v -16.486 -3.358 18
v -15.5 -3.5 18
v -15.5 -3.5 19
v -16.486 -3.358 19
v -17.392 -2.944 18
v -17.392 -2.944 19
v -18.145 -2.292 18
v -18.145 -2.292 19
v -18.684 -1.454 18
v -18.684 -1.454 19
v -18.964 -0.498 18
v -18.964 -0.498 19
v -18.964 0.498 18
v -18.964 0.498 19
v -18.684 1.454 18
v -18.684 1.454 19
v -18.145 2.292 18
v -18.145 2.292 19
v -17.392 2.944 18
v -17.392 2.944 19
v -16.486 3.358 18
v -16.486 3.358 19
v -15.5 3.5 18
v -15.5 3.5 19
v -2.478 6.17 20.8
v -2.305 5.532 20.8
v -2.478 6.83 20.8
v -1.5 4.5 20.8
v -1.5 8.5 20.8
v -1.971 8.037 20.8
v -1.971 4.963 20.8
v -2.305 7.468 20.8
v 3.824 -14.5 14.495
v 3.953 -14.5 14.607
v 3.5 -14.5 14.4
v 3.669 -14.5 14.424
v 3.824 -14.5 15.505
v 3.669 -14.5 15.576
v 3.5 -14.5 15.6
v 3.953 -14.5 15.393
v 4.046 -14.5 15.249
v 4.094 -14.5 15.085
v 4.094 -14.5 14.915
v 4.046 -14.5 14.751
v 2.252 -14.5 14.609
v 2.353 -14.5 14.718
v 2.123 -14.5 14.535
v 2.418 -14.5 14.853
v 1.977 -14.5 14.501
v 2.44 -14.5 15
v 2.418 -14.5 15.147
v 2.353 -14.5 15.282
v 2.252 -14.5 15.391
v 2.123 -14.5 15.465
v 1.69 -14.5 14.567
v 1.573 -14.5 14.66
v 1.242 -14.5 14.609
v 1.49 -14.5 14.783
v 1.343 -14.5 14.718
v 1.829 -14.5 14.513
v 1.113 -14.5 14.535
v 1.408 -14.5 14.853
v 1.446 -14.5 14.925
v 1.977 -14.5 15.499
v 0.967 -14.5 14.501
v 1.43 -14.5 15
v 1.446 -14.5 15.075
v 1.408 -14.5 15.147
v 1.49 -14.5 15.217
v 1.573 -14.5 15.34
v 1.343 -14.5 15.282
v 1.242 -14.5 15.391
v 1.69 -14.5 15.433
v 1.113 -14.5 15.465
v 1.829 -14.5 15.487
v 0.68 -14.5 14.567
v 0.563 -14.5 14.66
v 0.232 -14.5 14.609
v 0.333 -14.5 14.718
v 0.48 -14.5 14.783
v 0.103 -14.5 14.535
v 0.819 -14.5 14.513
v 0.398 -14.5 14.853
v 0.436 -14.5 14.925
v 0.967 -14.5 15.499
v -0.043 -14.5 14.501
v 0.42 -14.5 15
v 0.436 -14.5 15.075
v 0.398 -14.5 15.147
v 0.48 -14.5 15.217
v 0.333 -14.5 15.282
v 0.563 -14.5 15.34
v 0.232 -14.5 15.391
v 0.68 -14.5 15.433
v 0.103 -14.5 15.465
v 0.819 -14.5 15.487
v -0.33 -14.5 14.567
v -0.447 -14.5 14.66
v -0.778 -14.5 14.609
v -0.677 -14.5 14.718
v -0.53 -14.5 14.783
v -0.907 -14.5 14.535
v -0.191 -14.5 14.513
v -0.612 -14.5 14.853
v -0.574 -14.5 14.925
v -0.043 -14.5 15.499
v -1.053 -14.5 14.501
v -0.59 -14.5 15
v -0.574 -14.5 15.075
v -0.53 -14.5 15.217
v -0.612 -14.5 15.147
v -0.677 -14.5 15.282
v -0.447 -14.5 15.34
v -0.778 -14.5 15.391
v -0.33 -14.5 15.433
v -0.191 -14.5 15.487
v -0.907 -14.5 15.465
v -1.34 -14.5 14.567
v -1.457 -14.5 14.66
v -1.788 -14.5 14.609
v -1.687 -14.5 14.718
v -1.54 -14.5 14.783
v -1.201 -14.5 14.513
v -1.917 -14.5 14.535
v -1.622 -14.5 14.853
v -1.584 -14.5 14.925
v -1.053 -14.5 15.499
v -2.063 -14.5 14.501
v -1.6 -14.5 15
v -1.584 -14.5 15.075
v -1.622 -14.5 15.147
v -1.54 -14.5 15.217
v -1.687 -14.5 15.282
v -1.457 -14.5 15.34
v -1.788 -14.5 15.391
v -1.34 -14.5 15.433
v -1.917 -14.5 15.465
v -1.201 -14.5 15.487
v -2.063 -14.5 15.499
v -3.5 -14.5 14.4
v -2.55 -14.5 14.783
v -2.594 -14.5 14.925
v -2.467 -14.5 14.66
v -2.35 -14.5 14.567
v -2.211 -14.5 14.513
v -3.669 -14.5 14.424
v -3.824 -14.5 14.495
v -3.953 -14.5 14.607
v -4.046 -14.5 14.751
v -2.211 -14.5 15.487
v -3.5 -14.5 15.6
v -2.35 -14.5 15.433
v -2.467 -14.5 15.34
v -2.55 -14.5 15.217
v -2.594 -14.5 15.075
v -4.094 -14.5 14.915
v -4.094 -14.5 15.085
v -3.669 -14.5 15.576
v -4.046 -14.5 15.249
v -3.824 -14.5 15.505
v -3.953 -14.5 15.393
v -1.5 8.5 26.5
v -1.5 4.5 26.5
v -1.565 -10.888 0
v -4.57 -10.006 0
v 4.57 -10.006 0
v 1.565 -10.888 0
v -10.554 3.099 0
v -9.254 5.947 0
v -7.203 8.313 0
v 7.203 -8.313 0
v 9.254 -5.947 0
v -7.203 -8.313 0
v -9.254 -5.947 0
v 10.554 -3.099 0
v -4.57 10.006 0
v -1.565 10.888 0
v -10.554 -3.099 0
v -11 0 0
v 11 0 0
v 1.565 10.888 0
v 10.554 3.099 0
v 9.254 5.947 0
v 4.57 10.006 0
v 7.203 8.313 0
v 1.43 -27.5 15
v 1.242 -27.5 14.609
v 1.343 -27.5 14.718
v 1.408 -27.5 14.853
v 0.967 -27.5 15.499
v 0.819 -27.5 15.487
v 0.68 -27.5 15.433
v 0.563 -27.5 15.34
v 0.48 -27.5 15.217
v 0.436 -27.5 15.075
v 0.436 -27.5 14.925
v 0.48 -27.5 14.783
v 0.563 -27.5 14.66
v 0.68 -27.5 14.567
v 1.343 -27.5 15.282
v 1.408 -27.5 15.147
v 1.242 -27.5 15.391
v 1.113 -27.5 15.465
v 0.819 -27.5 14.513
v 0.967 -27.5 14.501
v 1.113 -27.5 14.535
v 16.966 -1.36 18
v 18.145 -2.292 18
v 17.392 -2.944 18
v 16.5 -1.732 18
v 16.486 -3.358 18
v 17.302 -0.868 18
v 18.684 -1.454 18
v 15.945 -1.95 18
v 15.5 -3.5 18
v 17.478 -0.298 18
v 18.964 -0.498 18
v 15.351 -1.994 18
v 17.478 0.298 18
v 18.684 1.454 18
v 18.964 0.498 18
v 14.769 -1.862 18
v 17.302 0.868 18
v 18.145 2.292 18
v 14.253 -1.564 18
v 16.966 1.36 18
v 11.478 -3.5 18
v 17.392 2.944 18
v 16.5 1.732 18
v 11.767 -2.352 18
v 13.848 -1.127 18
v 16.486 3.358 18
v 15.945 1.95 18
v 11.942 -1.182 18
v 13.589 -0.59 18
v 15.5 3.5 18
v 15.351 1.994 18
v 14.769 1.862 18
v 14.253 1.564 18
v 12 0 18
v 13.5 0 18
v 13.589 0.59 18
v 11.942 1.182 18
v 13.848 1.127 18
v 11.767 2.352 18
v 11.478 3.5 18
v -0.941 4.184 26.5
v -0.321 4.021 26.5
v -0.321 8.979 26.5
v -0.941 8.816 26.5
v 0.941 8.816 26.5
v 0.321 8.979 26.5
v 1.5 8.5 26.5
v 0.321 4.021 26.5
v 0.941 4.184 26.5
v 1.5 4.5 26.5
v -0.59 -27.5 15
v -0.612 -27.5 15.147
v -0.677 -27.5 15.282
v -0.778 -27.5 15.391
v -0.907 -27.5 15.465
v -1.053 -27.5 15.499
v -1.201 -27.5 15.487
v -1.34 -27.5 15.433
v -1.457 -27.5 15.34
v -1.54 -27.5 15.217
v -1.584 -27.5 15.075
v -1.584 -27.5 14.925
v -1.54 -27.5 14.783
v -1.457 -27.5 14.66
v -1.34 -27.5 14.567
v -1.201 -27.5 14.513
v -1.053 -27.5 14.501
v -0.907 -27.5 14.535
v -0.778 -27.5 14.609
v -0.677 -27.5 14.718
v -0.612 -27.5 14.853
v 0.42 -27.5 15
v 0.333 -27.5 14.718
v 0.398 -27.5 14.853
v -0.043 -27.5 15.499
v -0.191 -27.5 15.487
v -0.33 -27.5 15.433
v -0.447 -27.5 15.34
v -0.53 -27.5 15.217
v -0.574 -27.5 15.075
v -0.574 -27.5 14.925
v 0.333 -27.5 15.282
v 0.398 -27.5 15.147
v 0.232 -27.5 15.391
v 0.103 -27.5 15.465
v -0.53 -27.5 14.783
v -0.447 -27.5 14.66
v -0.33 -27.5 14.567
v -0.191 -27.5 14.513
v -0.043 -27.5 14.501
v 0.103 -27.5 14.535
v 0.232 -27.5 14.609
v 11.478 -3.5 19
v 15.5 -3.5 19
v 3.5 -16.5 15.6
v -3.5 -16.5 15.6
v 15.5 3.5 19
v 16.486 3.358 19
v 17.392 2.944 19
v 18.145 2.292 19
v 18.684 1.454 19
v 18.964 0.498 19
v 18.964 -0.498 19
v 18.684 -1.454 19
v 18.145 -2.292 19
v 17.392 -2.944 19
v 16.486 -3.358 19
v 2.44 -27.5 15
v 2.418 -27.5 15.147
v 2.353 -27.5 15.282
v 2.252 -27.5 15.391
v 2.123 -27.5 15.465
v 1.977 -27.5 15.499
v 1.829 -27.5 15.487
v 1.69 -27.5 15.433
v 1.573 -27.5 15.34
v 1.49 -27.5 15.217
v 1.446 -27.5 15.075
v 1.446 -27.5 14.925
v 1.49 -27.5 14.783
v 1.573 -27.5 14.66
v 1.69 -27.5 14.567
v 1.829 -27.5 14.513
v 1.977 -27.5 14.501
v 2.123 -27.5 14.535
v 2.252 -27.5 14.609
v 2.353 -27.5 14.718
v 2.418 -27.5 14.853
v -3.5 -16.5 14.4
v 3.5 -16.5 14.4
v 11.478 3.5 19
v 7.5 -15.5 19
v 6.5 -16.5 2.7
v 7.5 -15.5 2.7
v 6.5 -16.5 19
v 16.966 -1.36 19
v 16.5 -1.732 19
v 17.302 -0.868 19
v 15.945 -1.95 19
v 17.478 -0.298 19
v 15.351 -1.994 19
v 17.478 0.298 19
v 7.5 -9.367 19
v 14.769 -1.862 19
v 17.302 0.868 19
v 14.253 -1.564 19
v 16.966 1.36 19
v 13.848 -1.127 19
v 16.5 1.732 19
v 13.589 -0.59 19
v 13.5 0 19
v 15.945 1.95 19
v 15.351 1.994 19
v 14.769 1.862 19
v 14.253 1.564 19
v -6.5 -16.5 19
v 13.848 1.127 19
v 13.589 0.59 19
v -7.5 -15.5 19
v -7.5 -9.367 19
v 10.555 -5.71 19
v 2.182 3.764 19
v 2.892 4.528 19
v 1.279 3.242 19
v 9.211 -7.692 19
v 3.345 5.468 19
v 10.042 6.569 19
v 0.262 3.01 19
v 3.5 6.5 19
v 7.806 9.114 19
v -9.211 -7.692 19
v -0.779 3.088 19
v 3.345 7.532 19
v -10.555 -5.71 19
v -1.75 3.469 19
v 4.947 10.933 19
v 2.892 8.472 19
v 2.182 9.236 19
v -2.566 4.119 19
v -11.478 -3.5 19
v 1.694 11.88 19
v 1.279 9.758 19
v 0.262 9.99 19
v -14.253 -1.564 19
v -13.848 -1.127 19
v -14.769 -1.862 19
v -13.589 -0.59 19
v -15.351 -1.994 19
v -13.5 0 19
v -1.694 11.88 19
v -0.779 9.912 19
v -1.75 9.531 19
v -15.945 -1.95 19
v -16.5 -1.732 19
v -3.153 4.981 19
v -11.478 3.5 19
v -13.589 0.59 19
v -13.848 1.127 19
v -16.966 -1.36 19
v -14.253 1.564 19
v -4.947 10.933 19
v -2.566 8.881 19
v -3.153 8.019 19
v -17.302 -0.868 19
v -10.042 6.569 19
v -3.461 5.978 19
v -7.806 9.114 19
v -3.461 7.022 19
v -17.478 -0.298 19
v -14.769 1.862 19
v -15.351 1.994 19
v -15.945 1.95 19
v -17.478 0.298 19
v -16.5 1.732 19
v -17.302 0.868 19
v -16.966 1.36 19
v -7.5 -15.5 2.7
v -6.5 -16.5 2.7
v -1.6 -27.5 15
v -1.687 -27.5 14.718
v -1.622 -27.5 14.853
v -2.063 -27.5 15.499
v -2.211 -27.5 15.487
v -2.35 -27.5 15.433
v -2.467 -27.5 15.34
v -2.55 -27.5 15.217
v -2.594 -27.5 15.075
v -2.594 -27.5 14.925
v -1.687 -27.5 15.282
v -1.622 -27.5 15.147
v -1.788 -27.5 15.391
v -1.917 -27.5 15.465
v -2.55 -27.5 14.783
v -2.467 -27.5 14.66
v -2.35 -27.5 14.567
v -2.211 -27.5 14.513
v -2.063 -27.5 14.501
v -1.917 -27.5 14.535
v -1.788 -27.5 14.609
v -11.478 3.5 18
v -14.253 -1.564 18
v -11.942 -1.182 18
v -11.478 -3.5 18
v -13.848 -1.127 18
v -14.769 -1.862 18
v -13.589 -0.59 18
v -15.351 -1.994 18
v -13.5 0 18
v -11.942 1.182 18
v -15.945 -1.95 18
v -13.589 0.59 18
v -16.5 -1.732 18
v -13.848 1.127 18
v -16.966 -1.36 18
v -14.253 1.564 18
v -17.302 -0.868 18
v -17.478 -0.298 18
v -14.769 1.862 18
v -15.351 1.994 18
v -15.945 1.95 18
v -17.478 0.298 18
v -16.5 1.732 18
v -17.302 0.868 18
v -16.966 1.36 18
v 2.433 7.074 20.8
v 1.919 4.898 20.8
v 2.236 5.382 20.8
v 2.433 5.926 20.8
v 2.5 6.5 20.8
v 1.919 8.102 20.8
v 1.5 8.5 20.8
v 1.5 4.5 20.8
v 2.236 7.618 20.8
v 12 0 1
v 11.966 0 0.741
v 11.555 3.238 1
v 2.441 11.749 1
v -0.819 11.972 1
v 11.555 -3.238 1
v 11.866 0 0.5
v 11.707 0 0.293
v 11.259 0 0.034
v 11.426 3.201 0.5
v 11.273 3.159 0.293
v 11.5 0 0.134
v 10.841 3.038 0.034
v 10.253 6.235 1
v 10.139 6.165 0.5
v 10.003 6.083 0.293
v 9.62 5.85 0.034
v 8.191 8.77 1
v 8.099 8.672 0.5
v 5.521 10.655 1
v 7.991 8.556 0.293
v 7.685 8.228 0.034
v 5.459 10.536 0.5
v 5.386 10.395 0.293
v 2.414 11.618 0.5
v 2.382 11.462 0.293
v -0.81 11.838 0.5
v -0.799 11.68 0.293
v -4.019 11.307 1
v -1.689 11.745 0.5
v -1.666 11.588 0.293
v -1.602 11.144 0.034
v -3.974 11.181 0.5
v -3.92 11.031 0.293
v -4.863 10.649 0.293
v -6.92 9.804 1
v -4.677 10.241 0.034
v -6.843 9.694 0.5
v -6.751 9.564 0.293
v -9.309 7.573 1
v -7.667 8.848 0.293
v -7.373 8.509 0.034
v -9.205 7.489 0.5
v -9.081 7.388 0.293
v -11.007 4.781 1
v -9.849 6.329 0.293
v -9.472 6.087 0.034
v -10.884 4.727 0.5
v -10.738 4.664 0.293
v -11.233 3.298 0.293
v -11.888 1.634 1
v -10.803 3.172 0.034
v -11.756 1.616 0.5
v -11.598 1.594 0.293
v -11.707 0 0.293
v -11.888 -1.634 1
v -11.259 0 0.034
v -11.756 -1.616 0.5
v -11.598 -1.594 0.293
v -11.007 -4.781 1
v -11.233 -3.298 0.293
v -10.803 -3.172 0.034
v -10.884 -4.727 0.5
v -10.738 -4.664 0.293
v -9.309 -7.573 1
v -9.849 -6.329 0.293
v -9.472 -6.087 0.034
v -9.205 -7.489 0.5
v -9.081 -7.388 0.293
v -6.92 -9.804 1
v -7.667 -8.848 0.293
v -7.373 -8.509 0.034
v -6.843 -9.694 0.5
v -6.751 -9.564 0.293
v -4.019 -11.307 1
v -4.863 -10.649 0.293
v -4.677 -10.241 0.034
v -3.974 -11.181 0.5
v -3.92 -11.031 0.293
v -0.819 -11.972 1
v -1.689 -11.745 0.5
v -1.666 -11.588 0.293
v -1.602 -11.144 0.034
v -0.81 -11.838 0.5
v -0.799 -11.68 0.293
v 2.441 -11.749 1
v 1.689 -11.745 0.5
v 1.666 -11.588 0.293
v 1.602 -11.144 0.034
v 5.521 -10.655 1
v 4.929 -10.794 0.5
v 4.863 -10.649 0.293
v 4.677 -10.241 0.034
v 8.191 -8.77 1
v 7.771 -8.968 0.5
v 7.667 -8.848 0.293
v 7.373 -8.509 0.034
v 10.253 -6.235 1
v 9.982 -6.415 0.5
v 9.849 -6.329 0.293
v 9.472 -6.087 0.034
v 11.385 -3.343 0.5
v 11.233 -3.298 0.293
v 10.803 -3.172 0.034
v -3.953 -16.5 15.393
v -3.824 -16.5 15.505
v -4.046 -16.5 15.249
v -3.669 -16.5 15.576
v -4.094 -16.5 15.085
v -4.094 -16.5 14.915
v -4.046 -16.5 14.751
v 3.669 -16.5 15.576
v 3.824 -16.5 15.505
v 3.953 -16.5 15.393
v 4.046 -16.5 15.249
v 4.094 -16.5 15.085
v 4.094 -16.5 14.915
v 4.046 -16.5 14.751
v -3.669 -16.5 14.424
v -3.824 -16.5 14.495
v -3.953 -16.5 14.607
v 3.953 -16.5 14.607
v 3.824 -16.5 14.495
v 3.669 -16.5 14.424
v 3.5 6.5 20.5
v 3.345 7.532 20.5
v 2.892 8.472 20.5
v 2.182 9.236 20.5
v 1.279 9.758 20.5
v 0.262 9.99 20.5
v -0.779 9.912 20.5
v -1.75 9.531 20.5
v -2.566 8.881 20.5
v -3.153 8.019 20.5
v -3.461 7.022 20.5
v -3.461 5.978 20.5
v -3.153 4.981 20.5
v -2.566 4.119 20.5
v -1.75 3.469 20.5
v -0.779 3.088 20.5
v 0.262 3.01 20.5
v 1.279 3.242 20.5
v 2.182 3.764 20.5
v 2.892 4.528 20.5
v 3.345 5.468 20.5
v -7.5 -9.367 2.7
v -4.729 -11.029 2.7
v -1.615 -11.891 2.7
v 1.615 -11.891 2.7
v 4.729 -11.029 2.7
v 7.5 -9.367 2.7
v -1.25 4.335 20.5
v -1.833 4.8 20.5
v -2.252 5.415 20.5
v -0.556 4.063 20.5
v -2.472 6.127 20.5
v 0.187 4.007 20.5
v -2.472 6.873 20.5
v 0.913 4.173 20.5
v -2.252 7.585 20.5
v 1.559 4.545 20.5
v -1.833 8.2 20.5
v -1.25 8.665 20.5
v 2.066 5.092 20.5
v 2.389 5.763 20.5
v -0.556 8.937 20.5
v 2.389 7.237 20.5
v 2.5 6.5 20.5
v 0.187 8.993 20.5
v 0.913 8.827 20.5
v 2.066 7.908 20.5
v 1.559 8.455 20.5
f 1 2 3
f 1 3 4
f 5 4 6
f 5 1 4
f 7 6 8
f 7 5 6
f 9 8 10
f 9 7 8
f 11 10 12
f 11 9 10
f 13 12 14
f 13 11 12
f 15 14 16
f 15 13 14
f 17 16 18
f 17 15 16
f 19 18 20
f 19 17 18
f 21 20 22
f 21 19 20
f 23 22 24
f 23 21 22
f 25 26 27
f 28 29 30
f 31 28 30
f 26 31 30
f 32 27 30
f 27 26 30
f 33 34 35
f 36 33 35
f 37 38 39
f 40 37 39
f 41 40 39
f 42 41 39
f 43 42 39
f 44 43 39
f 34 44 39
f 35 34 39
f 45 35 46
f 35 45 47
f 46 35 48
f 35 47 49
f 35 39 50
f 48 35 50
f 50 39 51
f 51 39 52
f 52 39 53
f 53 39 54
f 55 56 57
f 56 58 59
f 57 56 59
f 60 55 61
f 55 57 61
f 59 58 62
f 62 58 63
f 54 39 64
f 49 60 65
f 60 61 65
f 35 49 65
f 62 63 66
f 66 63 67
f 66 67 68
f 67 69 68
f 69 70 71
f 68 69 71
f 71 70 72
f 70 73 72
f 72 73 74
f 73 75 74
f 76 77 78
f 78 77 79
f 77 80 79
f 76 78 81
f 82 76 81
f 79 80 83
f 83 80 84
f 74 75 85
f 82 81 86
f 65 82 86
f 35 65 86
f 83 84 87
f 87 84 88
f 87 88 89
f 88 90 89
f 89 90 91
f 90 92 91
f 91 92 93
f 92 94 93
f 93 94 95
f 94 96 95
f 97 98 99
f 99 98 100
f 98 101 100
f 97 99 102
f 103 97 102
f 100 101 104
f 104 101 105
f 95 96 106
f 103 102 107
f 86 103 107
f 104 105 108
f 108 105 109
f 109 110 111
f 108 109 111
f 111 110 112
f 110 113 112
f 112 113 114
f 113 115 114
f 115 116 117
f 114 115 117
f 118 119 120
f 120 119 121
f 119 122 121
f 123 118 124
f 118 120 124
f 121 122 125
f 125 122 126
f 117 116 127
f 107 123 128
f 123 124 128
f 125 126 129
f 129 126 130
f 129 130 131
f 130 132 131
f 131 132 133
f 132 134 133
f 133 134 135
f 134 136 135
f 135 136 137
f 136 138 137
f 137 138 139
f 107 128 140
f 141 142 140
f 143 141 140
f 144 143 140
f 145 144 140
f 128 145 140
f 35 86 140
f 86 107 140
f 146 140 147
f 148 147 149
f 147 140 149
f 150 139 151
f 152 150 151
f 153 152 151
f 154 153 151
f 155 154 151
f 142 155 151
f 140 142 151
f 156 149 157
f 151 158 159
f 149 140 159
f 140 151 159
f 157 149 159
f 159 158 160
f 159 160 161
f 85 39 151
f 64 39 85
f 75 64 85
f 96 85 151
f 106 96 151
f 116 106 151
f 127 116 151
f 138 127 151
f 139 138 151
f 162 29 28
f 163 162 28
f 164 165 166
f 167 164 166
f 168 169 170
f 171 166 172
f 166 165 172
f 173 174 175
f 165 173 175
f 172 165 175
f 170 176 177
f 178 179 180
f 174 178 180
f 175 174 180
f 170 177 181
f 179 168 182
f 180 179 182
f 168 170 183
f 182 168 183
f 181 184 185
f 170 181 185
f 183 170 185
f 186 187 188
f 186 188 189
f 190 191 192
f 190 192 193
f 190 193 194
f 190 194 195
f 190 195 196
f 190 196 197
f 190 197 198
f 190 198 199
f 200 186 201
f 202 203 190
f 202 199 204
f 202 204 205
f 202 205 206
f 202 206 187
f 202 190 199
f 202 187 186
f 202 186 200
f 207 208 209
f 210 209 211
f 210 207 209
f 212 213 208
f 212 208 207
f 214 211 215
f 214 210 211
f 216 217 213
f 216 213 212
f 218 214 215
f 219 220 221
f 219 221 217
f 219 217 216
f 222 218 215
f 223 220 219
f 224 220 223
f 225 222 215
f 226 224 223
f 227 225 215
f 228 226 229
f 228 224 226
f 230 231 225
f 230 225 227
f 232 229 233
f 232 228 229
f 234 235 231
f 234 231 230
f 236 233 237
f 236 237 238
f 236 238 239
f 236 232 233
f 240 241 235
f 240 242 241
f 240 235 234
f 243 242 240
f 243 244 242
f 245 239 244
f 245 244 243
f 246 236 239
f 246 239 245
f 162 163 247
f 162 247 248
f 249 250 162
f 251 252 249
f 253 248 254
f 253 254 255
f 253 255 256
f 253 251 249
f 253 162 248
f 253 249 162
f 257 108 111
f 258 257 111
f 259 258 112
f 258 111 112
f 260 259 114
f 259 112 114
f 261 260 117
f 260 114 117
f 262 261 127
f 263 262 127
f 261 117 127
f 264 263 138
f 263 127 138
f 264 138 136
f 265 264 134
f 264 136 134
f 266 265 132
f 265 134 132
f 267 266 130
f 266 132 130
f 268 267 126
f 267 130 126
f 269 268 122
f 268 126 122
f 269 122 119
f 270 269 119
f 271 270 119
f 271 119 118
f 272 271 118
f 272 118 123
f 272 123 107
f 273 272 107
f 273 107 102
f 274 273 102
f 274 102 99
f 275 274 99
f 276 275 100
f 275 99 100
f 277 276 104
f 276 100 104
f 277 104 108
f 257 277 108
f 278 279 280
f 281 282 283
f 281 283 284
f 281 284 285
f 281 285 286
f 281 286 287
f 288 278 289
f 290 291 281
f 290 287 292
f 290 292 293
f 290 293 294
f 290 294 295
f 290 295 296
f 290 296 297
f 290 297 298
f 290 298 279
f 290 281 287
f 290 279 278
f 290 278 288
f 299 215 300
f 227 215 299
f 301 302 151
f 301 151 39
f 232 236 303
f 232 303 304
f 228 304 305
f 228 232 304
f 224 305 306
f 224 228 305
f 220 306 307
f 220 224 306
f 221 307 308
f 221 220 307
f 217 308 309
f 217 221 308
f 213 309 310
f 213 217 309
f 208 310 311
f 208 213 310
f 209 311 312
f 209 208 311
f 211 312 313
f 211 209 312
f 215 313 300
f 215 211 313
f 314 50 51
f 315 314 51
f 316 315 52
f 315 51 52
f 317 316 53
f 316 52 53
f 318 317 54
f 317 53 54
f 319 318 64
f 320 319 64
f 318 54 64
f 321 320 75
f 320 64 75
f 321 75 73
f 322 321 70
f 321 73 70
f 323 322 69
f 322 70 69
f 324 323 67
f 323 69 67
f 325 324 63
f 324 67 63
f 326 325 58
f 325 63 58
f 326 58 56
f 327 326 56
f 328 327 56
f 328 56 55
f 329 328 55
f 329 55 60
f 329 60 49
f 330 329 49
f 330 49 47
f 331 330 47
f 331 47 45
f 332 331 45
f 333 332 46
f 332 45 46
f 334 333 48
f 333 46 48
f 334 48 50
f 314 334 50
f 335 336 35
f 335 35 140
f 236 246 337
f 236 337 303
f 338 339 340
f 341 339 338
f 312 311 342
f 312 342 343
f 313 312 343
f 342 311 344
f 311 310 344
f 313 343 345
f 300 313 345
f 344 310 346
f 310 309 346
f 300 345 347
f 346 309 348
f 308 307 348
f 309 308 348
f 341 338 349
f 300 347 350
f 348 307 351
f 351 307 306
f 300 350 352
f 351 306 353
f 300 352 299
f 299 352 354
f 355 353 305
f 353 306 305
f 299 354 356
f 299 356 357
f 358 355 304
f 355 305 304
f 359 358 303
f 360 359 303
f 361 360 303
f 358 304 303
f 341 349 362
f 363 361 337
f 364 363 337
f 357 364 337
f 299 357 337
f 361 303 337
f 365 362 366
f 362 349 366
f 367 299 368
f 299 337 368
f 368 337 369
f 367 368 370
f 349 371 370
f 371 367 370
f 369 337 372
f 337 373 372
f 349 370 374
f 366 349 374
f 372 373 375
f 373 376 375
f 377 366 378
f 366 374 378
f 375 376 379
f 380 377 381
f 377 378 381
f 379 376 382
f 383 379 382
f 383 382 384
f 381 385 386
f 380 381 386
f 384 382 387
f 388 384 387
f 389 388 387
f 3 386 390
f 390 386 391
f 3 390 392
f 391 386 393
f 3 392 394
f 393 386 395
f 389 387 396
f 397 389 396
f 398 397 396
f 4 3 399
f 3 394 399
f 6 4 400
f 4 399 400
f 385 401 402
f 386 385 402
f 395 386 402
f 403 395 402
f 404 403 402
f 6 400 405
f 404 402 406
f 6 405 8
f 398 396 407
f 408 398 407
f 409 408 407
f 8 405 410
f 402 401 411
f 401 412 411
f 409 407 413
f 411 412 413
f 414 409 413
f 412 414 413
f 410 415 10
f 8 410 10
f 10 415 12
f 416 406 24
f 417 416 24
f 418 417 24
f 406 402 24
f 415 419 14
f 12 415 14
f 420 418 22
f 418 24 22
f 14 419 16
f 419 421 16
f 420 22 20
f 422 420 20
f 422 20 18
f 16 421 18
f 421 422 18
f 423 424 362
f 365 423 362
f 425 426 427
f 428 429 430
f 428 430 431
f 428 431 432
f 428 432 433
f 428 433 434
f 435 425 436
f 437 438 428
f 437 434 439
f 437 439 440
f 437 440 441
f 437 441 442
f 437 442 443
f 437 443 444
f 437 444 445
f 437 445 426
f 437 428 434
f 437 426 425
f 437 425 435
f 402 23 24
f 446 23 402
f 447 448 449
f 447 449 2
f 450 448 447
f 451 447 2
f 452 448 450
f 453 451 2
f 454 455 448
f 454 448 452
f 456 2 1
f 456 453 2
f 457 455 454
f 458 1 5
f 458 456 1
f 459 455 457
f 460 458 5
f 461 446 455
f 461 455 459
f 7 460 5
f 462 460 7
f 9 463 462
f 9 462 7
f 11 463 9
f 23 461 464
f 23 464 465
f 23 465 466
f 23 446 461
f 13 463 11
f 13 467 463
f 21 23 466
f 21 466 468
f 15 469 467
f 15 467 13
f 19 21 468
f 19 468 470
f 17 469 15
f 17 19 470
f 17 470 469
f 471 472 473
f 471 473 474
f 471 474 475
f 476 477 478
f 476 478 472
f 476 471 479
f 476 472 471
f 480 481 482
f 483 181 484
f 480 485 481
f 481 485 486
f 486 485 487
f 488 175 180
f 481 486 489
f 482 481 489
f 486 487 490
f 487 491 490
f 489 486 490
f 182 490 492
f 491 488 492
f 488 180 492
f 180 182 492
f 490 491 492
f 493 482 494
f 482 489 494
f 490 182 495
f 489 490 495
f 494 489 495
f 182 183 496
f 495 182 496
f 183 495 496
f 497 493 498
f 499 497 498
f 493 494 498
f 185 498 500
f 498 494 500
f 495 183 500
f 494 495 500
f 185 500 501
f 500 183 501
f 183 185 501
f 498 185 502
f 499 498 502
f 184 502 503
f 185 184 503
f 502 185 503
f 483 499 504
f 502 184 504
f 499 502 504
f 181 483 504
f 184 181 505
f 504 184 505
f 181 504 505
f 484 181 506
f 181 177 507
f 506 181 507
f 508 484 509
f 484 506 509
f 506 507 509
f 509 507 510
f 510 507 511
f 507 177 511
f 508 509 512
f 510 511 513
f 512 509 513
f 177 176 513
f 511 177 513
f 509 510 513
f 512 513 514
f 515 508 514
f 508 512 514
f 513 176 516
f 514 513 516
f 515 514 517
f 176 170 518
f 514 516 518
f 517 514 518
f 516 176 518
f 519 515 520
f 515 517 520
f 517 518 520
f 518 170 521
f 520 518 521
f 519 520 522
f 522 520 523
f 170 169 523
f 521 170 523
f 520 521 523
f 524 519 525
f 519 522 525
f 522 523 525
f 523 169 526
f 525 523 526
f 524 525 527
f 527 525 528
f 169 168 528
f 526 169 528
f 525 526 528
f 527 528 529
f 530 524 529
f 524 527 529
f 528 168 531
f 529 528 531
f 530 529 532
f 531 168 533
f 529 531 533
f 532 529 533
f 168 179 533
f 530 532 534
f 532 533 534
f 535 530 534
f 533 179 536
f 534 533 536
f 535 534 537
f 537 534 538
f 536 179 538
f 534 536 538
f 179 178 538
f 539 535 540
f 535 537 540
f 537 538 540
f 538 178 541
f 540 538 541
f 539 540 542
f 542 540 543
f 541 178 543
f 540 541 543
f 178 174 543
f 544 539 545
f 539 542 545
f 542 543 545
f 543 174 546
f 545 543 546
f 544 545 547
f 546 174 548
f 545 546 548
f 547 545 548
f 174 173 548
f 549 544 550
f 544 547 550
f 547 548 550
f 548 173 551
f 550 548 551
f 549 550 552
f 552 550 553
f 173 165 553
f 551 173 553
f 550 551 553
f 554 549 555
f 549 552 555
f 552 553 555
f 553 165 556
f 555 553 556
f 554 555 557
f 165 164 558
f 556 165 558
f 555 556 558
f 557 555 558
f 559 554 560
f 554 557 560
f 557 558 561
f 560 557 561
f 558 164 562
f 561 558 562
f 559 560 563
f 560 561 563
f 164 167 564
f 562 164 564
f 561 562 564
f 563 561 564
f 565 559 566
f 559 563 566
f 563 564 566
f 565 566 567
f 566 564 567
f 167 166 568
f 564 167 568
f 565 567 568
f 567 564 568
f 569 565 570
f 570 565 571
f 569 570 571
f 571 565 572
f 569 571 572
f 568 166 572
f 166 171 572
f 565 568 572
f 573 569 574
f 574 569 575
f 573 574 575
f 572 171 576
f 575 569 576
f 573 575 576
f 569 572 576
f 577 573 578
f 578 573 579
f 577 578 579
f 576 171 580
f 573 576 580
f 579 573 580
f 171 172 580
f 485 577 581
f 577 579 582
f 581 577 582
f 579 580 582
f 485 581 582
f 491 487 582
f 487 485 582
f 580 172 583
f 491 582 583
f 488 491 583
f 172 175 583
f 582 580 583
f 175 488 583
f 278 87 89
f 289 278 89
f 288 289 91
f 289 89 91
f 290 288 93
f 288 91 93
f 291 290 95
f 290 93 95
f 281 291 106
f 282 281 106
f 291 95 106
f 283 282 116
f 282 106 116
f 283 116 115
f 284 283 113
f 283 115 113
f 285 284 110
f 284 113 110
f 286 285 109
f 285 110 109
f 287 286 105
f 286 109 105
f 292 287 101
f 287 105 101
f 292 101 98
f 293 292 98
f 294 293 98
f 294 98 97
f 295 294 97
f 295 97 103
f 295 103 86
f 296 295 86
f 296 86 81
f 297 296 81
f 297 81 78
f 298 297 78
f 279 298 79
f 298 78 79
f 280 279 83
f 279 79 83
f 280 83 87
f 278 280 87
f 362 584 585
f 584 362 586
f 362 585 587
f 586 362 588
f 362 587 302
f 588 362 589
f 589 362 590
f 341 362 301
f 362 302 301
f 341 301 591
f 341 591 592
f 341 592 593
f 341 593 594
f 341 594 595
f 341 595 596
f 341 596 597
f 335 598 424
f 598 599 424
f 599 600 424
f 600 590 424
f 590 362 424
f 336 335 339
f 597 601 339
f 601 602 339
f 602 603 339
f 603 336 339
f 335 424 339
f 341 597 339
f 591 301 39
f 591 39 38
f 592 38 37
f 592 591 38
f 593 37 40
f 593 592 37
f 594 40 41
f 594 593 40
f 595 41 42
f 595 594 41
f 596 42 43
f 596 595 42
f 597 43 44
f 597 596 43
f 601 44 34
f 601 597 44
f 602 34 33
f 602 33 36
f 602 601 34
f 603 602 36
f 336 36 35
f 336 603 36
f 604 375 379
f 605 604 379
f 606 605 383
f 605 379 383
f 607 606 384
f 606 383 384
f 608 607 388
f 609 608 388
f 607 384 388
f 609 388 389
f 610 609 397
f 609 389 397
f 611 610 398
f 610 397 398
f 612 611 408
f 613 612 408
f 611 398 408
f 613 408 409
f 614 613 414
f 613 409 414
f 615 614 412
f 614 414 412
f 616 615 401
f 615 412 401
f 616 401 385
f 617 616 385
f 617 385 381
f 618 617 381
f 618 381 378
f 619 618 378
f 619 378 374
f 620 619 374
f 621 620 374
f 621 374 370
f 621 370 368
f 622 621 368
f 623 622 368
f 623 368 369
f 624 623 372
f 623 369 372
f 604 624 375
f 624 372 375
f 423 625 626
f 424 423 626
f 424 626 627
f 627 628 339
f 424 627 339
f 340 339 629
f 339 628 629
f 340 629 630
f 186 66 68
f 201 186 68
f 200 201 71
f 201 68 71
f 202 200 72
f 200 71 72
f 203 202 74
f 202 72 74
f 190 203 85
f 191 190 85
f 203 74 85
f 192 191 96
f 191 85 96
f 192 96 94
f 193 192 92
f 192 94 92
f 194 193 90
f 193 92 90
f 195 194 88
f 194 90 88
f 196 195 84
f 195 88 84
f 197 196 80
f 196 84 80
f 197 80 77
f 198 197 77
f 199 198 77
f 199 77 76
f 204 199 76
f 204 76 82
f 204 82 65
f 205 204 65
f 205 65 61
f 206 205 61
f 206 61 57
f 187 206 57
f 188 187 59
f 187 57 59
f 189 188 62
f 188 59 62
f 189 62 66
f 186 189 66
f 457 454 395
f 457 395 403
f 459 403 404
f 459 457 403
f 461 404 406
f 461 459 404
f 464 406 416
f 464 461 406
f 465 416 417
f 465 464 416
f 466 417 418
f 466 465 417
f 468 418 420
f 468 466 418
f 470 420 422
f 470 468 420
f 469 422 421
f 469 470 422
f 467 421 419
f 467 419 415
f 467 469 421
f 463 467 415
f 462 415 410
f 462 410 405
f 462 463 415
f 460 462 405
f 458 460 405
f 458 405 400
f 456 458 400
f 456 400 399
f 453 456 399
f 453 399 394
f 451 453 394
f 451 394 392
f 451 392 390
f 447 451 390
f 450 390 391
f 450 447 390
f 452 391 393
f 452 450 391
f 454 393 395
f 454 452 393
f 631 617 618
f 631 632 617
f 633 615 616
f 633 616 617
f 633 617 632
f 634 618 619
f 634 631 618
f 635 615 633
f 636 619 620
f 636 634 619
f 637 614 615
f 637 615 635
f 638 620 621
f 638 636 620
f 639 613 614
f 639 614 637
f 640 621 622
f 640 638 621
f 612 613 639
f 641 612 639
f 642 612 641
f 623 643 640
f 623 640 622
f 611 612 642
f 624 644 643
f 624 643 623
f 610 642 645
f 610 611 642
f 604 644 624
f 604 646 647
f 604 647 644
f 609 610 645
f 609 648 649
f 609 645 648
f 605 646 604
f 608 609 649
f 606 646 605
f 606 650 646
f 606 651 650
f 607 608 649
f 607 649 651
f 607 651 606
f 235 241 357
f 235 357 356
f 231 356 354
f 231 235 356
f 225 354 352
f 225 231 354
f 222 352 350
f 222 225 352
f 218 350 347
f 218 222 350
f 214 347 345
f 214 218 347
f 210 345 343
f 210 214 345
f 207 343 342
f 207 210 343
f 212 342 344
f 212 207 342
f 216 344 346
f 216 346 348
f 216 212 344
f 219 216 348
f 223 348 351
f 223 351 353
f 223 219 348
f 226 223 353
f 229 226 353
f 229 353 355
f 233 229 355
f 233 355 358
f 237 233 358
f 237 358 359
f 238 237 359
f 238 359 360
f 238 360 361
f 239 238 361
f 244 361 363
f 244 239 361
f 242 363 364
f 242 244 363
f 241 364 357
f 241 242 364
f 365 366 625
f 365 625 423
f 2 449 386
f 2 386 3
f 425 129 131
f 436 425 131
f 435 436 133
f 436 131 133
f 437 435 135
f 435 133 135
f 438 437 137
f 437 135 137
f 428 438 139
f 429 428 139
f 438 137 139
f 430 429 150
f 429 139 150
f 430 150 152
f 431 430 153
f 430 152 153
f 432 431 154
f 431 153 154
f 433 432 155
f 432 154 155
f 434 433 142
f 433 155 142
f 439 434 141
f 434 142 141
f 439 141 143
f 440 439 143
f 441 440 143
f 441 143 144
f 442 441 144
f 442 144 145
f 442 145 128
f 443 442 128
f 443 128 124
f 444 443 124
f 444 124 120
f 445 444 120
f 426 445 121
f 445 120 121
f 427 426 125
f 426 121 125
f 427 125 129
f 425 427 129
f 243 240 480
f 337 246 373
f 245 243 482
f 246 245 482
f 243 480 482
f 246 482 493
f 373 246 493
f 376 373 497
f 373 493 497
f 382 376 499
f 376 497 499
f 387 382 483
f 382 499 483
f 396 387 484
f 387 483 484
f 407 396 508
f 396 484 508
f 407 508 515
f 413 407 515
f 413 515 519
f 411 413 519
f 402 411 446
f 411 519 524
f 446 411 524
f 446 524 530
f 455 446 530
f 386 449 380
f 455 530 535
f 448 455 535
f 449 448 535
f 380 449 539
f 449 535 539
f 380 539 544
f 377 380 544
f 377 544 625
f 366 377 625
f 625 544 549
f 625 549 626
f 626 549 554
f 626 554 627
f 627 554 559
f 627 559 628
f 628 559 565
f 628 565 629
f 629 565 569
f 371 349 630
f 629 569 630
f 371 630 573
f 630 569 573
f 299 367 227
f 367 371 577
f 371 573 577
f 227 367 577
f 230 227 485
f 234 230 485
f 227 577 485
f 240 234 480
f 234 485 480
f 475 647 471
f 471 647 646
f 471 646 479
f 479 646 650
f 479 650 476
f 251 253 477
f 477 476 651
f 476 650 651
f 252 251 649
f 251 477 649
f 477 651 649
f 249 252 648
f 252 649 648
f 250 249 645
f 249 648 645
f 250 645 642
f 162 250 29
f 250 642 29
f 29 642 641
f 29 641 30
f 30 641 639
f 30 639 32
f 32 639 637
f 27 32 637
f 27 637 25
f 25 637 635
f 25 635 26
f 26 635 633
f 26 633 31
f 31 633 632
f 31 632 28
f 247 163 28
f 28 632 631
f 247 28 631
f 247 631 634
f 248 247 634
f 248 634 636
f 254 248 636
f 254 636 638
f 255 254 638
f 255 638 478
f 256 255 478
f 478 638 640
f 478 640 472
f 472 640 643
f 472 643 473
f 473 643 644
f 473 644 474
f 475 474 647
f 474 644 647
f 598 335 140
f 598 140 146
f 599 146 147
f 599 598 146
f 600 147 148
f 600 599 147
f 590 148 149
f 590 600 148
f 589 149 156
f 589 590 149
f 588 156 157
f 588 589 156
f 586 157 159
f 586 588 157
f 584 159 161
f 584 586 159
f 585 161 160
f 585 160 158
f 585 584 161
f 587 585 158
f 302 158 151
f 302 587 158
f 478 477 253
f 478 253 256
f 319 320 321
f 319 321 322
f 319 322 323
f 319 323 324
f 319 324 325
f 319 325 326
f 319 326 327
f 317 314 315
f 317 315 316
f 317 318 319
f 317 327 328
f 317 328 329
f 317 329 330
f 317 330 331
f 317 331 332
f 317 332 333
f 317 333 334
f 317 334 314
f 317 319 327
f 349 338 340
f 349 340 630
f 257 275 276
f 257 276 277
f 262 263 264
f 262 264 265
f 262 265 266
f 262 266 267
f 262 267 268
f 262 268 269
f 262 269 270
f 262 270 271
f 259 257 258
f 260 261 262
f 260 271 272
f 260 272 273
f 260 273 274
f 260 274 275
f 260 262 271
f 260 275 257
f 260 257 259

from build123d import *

# Parameters (mm, degrees)
SKETCH_1_R          = 12
EXTRUDE_1_DEPTH     = 19
EXTRUDE_START       = -1
SKETCH_2_R          = 2
EXTRUDE_2_DEPTH     = 1
SKETCH_3_R          = 3.5
EXTRUDE_3_DEPTH     = 1.5
SKETCH_4_R          = 2.5
EXTRUDE_4_DEPTH     = 6
CUT_EXTRUDE_START   = -5.7
CUT_EXTRUDE_1_DEPTH = 5.7
EXTRUDE_START_2     = -16.3
EXTRUDE_5_DEPTH     = 16.3
CHAMFER_1_SIZE      = 1
FILLET_1_R          = 1
CUT_EXTRUDE_2_DEPTH = 2
SKETCH_8_R          = 0.5
EXTRUDE_6_DEPTH     = 13


with BuildPart() as part:
    # Эскиз1 → Бобышка-Вытянуть1 (new body)
    with BuildSketch(Plane.XY):
        Circle(SKETCH_1_R)
    extrude(amount=EXTRUDE_1_DEPTH)

    # Эскиз2 → Бобышка-Вытянуть2 (add)
    # profile 1 of 2: a face of its own
    with BuildSketch(Plane.XY.offset(19).offset(EXTRUDE_START)):
        with BuildLine():
            Line((-15.5, 3.5), (-11.478240283, 3.5))
            ThreePointArc((-11.478240283, 3.5), (-12, 0), (-11.478240283, -3.5))
            Line((-11.478240283, -3.5), (-15.5, -3.5))
            ThreePointArc((-15.5, -3.5), (-19, 0), (-15.5, 3.5))
        make_face()
        with Locations((-15.5, 0)):
            Circle(SKETCH_2_R, mode=Mode.SUBTRACT)
    # profile 2 of 2: a face of its own
    with BuildSketch(Plane.XY.offset(19).offset(EXTRUDE_START)):
        with BuildLine():
            Line((15.5, -3.5), (11.478240283, -3.5))
            ThreePointArc((11.478240283, -3.5), (12, 0), (11.478240283, 3.5))
            Line((11.478240283, 3.5), (15.5, 3.5))
            ThreePointArc((15.5, 3.5), (19, 0), (15.5, -3.5))
        make_face()
        with Locations(Location((15.5, 0, 0), (0, 0, 180))):
            Circle(SKETCH_2_R, mode=Mode.SUBTRACT)
    extrude(amount=EXTRUDE_2_DEPTH)

    # Эскиз3 → Бобышка-Вытянуть3 (add)
    with BuildSketch(Plane.XY.offset(19)):
        with Locations((0, 6.5)):
            Circle(SKETCH_3_R)
    extrude(amount=EXTRUDE_3_DEPTH)

    # Эскиз4 → Бобышка-Вытянуть4 (add)
    with BuildSketch(Plane.XY.offset(20.5)):
        with Locations((0, 6.5)):
            Circle(SKETCH_4_R)
    extrude(amount=EXTRUDE_4_DEPTH)

    # Эскиз5 → Вырез-Вытянуть1 (cut)
    with BuildSketch(Plane.XY.offset(26.5).offset(CUT_EXTRUDE_START)):
        with BuildLine():
            Line((-1.5, 8.5), (-1.5, 4.5))
            ThreePointArc((-1.5, 4.5), (-2.5, 6.5), (-1.5, 8.5))
        make_face()
        with BuildLine():
            Line((1.5, 8.5), (1.5, 4.5))
            ThreePointArc((1.5, 4.5), (2.5, 6.5), (1.5, 8.5))
        make_face()
    extrude(amount=CUT_EXTRUDE_1_DEPTH, mode=Mode.SUBTRACT)

    # Эскиз6 → Бобышка-Вытянуть5 (add)
    with BuildSketch(Plane.XY.offset(19).offset(EXTRUDE_START_2)):
        with BuildLine():
            Line((-7.5, -16.5), (7.5, -16.5))
            Line((7.5, -16.5), (7.5, -9.367496998))
            ThreePointArc((7.5, -9.367496998), (0, -12), (-7.5, -9.367496998))
            Line((-7.5, -9.367496998), (-7.5, -16.5))
        make_face()
    extrude(amount=EXTRUDE_5_DEPTH)

    # Фаска1
    chamfer_1_edges = [part.edges().sort_by_distance(p)[0] for p in [
        (-7.5, -16.5, 10.85),
        (7.5, -16.5, 10.85),
    ]]
    chamfer(chamfer_1_edges, length=CHAMFER_1_SIZE)

    # Скругление1
    fillet_1_edges = [part.edges().sort_by_distance(p)[0] for p in [
        (-12, 0, 0),
    ]]
    fillet(fillet_1_edges, radius=FILLET_1_R)

    # Эскиз7 → Вырез-Вытянуть2 (cut)
    with BuildSketch(Plane.XZ.offset(16.5)):
        with BuildLine():
            Line((-3.5, 15.6), (3.5, 15.6))
            ThreePointArc((3.5, 15.6), (4.1, 15), (3.5, 14.4))
            Line((3.5, 14.4), (-3.5, 14.4))
            ThreePointArc((-3.5, 14.4), (-4.1, 15), (-3.5, 15.6))
        make_face()
    extrude(amount=-CUT_EXTRUDE_2_DEPTH, mode=Mode.SUBTRACT)

    # Эскиз8 → Бобышка-Вытянуть6 (add)
    with BuildSketch(Plane.XZ.offset(14.5)):
        with Locations((-2.1, 15)):
            Circle(SKETCH_8_R)
        with Locations((-1.09, 15)):
            Circle(SKETCH_8_R)
        with Locations((-0.08, 15)):
            Circle(SKETCH_8_R)
        with Locations((0.93, 15)):
            Circle(SKETCH_8_R)
        with Locations((1.94, 15)):
            Circle(SKETCH_8_R)
    extrude(amount=EXTRUDE_6_DEPTH)


solid = part.part
